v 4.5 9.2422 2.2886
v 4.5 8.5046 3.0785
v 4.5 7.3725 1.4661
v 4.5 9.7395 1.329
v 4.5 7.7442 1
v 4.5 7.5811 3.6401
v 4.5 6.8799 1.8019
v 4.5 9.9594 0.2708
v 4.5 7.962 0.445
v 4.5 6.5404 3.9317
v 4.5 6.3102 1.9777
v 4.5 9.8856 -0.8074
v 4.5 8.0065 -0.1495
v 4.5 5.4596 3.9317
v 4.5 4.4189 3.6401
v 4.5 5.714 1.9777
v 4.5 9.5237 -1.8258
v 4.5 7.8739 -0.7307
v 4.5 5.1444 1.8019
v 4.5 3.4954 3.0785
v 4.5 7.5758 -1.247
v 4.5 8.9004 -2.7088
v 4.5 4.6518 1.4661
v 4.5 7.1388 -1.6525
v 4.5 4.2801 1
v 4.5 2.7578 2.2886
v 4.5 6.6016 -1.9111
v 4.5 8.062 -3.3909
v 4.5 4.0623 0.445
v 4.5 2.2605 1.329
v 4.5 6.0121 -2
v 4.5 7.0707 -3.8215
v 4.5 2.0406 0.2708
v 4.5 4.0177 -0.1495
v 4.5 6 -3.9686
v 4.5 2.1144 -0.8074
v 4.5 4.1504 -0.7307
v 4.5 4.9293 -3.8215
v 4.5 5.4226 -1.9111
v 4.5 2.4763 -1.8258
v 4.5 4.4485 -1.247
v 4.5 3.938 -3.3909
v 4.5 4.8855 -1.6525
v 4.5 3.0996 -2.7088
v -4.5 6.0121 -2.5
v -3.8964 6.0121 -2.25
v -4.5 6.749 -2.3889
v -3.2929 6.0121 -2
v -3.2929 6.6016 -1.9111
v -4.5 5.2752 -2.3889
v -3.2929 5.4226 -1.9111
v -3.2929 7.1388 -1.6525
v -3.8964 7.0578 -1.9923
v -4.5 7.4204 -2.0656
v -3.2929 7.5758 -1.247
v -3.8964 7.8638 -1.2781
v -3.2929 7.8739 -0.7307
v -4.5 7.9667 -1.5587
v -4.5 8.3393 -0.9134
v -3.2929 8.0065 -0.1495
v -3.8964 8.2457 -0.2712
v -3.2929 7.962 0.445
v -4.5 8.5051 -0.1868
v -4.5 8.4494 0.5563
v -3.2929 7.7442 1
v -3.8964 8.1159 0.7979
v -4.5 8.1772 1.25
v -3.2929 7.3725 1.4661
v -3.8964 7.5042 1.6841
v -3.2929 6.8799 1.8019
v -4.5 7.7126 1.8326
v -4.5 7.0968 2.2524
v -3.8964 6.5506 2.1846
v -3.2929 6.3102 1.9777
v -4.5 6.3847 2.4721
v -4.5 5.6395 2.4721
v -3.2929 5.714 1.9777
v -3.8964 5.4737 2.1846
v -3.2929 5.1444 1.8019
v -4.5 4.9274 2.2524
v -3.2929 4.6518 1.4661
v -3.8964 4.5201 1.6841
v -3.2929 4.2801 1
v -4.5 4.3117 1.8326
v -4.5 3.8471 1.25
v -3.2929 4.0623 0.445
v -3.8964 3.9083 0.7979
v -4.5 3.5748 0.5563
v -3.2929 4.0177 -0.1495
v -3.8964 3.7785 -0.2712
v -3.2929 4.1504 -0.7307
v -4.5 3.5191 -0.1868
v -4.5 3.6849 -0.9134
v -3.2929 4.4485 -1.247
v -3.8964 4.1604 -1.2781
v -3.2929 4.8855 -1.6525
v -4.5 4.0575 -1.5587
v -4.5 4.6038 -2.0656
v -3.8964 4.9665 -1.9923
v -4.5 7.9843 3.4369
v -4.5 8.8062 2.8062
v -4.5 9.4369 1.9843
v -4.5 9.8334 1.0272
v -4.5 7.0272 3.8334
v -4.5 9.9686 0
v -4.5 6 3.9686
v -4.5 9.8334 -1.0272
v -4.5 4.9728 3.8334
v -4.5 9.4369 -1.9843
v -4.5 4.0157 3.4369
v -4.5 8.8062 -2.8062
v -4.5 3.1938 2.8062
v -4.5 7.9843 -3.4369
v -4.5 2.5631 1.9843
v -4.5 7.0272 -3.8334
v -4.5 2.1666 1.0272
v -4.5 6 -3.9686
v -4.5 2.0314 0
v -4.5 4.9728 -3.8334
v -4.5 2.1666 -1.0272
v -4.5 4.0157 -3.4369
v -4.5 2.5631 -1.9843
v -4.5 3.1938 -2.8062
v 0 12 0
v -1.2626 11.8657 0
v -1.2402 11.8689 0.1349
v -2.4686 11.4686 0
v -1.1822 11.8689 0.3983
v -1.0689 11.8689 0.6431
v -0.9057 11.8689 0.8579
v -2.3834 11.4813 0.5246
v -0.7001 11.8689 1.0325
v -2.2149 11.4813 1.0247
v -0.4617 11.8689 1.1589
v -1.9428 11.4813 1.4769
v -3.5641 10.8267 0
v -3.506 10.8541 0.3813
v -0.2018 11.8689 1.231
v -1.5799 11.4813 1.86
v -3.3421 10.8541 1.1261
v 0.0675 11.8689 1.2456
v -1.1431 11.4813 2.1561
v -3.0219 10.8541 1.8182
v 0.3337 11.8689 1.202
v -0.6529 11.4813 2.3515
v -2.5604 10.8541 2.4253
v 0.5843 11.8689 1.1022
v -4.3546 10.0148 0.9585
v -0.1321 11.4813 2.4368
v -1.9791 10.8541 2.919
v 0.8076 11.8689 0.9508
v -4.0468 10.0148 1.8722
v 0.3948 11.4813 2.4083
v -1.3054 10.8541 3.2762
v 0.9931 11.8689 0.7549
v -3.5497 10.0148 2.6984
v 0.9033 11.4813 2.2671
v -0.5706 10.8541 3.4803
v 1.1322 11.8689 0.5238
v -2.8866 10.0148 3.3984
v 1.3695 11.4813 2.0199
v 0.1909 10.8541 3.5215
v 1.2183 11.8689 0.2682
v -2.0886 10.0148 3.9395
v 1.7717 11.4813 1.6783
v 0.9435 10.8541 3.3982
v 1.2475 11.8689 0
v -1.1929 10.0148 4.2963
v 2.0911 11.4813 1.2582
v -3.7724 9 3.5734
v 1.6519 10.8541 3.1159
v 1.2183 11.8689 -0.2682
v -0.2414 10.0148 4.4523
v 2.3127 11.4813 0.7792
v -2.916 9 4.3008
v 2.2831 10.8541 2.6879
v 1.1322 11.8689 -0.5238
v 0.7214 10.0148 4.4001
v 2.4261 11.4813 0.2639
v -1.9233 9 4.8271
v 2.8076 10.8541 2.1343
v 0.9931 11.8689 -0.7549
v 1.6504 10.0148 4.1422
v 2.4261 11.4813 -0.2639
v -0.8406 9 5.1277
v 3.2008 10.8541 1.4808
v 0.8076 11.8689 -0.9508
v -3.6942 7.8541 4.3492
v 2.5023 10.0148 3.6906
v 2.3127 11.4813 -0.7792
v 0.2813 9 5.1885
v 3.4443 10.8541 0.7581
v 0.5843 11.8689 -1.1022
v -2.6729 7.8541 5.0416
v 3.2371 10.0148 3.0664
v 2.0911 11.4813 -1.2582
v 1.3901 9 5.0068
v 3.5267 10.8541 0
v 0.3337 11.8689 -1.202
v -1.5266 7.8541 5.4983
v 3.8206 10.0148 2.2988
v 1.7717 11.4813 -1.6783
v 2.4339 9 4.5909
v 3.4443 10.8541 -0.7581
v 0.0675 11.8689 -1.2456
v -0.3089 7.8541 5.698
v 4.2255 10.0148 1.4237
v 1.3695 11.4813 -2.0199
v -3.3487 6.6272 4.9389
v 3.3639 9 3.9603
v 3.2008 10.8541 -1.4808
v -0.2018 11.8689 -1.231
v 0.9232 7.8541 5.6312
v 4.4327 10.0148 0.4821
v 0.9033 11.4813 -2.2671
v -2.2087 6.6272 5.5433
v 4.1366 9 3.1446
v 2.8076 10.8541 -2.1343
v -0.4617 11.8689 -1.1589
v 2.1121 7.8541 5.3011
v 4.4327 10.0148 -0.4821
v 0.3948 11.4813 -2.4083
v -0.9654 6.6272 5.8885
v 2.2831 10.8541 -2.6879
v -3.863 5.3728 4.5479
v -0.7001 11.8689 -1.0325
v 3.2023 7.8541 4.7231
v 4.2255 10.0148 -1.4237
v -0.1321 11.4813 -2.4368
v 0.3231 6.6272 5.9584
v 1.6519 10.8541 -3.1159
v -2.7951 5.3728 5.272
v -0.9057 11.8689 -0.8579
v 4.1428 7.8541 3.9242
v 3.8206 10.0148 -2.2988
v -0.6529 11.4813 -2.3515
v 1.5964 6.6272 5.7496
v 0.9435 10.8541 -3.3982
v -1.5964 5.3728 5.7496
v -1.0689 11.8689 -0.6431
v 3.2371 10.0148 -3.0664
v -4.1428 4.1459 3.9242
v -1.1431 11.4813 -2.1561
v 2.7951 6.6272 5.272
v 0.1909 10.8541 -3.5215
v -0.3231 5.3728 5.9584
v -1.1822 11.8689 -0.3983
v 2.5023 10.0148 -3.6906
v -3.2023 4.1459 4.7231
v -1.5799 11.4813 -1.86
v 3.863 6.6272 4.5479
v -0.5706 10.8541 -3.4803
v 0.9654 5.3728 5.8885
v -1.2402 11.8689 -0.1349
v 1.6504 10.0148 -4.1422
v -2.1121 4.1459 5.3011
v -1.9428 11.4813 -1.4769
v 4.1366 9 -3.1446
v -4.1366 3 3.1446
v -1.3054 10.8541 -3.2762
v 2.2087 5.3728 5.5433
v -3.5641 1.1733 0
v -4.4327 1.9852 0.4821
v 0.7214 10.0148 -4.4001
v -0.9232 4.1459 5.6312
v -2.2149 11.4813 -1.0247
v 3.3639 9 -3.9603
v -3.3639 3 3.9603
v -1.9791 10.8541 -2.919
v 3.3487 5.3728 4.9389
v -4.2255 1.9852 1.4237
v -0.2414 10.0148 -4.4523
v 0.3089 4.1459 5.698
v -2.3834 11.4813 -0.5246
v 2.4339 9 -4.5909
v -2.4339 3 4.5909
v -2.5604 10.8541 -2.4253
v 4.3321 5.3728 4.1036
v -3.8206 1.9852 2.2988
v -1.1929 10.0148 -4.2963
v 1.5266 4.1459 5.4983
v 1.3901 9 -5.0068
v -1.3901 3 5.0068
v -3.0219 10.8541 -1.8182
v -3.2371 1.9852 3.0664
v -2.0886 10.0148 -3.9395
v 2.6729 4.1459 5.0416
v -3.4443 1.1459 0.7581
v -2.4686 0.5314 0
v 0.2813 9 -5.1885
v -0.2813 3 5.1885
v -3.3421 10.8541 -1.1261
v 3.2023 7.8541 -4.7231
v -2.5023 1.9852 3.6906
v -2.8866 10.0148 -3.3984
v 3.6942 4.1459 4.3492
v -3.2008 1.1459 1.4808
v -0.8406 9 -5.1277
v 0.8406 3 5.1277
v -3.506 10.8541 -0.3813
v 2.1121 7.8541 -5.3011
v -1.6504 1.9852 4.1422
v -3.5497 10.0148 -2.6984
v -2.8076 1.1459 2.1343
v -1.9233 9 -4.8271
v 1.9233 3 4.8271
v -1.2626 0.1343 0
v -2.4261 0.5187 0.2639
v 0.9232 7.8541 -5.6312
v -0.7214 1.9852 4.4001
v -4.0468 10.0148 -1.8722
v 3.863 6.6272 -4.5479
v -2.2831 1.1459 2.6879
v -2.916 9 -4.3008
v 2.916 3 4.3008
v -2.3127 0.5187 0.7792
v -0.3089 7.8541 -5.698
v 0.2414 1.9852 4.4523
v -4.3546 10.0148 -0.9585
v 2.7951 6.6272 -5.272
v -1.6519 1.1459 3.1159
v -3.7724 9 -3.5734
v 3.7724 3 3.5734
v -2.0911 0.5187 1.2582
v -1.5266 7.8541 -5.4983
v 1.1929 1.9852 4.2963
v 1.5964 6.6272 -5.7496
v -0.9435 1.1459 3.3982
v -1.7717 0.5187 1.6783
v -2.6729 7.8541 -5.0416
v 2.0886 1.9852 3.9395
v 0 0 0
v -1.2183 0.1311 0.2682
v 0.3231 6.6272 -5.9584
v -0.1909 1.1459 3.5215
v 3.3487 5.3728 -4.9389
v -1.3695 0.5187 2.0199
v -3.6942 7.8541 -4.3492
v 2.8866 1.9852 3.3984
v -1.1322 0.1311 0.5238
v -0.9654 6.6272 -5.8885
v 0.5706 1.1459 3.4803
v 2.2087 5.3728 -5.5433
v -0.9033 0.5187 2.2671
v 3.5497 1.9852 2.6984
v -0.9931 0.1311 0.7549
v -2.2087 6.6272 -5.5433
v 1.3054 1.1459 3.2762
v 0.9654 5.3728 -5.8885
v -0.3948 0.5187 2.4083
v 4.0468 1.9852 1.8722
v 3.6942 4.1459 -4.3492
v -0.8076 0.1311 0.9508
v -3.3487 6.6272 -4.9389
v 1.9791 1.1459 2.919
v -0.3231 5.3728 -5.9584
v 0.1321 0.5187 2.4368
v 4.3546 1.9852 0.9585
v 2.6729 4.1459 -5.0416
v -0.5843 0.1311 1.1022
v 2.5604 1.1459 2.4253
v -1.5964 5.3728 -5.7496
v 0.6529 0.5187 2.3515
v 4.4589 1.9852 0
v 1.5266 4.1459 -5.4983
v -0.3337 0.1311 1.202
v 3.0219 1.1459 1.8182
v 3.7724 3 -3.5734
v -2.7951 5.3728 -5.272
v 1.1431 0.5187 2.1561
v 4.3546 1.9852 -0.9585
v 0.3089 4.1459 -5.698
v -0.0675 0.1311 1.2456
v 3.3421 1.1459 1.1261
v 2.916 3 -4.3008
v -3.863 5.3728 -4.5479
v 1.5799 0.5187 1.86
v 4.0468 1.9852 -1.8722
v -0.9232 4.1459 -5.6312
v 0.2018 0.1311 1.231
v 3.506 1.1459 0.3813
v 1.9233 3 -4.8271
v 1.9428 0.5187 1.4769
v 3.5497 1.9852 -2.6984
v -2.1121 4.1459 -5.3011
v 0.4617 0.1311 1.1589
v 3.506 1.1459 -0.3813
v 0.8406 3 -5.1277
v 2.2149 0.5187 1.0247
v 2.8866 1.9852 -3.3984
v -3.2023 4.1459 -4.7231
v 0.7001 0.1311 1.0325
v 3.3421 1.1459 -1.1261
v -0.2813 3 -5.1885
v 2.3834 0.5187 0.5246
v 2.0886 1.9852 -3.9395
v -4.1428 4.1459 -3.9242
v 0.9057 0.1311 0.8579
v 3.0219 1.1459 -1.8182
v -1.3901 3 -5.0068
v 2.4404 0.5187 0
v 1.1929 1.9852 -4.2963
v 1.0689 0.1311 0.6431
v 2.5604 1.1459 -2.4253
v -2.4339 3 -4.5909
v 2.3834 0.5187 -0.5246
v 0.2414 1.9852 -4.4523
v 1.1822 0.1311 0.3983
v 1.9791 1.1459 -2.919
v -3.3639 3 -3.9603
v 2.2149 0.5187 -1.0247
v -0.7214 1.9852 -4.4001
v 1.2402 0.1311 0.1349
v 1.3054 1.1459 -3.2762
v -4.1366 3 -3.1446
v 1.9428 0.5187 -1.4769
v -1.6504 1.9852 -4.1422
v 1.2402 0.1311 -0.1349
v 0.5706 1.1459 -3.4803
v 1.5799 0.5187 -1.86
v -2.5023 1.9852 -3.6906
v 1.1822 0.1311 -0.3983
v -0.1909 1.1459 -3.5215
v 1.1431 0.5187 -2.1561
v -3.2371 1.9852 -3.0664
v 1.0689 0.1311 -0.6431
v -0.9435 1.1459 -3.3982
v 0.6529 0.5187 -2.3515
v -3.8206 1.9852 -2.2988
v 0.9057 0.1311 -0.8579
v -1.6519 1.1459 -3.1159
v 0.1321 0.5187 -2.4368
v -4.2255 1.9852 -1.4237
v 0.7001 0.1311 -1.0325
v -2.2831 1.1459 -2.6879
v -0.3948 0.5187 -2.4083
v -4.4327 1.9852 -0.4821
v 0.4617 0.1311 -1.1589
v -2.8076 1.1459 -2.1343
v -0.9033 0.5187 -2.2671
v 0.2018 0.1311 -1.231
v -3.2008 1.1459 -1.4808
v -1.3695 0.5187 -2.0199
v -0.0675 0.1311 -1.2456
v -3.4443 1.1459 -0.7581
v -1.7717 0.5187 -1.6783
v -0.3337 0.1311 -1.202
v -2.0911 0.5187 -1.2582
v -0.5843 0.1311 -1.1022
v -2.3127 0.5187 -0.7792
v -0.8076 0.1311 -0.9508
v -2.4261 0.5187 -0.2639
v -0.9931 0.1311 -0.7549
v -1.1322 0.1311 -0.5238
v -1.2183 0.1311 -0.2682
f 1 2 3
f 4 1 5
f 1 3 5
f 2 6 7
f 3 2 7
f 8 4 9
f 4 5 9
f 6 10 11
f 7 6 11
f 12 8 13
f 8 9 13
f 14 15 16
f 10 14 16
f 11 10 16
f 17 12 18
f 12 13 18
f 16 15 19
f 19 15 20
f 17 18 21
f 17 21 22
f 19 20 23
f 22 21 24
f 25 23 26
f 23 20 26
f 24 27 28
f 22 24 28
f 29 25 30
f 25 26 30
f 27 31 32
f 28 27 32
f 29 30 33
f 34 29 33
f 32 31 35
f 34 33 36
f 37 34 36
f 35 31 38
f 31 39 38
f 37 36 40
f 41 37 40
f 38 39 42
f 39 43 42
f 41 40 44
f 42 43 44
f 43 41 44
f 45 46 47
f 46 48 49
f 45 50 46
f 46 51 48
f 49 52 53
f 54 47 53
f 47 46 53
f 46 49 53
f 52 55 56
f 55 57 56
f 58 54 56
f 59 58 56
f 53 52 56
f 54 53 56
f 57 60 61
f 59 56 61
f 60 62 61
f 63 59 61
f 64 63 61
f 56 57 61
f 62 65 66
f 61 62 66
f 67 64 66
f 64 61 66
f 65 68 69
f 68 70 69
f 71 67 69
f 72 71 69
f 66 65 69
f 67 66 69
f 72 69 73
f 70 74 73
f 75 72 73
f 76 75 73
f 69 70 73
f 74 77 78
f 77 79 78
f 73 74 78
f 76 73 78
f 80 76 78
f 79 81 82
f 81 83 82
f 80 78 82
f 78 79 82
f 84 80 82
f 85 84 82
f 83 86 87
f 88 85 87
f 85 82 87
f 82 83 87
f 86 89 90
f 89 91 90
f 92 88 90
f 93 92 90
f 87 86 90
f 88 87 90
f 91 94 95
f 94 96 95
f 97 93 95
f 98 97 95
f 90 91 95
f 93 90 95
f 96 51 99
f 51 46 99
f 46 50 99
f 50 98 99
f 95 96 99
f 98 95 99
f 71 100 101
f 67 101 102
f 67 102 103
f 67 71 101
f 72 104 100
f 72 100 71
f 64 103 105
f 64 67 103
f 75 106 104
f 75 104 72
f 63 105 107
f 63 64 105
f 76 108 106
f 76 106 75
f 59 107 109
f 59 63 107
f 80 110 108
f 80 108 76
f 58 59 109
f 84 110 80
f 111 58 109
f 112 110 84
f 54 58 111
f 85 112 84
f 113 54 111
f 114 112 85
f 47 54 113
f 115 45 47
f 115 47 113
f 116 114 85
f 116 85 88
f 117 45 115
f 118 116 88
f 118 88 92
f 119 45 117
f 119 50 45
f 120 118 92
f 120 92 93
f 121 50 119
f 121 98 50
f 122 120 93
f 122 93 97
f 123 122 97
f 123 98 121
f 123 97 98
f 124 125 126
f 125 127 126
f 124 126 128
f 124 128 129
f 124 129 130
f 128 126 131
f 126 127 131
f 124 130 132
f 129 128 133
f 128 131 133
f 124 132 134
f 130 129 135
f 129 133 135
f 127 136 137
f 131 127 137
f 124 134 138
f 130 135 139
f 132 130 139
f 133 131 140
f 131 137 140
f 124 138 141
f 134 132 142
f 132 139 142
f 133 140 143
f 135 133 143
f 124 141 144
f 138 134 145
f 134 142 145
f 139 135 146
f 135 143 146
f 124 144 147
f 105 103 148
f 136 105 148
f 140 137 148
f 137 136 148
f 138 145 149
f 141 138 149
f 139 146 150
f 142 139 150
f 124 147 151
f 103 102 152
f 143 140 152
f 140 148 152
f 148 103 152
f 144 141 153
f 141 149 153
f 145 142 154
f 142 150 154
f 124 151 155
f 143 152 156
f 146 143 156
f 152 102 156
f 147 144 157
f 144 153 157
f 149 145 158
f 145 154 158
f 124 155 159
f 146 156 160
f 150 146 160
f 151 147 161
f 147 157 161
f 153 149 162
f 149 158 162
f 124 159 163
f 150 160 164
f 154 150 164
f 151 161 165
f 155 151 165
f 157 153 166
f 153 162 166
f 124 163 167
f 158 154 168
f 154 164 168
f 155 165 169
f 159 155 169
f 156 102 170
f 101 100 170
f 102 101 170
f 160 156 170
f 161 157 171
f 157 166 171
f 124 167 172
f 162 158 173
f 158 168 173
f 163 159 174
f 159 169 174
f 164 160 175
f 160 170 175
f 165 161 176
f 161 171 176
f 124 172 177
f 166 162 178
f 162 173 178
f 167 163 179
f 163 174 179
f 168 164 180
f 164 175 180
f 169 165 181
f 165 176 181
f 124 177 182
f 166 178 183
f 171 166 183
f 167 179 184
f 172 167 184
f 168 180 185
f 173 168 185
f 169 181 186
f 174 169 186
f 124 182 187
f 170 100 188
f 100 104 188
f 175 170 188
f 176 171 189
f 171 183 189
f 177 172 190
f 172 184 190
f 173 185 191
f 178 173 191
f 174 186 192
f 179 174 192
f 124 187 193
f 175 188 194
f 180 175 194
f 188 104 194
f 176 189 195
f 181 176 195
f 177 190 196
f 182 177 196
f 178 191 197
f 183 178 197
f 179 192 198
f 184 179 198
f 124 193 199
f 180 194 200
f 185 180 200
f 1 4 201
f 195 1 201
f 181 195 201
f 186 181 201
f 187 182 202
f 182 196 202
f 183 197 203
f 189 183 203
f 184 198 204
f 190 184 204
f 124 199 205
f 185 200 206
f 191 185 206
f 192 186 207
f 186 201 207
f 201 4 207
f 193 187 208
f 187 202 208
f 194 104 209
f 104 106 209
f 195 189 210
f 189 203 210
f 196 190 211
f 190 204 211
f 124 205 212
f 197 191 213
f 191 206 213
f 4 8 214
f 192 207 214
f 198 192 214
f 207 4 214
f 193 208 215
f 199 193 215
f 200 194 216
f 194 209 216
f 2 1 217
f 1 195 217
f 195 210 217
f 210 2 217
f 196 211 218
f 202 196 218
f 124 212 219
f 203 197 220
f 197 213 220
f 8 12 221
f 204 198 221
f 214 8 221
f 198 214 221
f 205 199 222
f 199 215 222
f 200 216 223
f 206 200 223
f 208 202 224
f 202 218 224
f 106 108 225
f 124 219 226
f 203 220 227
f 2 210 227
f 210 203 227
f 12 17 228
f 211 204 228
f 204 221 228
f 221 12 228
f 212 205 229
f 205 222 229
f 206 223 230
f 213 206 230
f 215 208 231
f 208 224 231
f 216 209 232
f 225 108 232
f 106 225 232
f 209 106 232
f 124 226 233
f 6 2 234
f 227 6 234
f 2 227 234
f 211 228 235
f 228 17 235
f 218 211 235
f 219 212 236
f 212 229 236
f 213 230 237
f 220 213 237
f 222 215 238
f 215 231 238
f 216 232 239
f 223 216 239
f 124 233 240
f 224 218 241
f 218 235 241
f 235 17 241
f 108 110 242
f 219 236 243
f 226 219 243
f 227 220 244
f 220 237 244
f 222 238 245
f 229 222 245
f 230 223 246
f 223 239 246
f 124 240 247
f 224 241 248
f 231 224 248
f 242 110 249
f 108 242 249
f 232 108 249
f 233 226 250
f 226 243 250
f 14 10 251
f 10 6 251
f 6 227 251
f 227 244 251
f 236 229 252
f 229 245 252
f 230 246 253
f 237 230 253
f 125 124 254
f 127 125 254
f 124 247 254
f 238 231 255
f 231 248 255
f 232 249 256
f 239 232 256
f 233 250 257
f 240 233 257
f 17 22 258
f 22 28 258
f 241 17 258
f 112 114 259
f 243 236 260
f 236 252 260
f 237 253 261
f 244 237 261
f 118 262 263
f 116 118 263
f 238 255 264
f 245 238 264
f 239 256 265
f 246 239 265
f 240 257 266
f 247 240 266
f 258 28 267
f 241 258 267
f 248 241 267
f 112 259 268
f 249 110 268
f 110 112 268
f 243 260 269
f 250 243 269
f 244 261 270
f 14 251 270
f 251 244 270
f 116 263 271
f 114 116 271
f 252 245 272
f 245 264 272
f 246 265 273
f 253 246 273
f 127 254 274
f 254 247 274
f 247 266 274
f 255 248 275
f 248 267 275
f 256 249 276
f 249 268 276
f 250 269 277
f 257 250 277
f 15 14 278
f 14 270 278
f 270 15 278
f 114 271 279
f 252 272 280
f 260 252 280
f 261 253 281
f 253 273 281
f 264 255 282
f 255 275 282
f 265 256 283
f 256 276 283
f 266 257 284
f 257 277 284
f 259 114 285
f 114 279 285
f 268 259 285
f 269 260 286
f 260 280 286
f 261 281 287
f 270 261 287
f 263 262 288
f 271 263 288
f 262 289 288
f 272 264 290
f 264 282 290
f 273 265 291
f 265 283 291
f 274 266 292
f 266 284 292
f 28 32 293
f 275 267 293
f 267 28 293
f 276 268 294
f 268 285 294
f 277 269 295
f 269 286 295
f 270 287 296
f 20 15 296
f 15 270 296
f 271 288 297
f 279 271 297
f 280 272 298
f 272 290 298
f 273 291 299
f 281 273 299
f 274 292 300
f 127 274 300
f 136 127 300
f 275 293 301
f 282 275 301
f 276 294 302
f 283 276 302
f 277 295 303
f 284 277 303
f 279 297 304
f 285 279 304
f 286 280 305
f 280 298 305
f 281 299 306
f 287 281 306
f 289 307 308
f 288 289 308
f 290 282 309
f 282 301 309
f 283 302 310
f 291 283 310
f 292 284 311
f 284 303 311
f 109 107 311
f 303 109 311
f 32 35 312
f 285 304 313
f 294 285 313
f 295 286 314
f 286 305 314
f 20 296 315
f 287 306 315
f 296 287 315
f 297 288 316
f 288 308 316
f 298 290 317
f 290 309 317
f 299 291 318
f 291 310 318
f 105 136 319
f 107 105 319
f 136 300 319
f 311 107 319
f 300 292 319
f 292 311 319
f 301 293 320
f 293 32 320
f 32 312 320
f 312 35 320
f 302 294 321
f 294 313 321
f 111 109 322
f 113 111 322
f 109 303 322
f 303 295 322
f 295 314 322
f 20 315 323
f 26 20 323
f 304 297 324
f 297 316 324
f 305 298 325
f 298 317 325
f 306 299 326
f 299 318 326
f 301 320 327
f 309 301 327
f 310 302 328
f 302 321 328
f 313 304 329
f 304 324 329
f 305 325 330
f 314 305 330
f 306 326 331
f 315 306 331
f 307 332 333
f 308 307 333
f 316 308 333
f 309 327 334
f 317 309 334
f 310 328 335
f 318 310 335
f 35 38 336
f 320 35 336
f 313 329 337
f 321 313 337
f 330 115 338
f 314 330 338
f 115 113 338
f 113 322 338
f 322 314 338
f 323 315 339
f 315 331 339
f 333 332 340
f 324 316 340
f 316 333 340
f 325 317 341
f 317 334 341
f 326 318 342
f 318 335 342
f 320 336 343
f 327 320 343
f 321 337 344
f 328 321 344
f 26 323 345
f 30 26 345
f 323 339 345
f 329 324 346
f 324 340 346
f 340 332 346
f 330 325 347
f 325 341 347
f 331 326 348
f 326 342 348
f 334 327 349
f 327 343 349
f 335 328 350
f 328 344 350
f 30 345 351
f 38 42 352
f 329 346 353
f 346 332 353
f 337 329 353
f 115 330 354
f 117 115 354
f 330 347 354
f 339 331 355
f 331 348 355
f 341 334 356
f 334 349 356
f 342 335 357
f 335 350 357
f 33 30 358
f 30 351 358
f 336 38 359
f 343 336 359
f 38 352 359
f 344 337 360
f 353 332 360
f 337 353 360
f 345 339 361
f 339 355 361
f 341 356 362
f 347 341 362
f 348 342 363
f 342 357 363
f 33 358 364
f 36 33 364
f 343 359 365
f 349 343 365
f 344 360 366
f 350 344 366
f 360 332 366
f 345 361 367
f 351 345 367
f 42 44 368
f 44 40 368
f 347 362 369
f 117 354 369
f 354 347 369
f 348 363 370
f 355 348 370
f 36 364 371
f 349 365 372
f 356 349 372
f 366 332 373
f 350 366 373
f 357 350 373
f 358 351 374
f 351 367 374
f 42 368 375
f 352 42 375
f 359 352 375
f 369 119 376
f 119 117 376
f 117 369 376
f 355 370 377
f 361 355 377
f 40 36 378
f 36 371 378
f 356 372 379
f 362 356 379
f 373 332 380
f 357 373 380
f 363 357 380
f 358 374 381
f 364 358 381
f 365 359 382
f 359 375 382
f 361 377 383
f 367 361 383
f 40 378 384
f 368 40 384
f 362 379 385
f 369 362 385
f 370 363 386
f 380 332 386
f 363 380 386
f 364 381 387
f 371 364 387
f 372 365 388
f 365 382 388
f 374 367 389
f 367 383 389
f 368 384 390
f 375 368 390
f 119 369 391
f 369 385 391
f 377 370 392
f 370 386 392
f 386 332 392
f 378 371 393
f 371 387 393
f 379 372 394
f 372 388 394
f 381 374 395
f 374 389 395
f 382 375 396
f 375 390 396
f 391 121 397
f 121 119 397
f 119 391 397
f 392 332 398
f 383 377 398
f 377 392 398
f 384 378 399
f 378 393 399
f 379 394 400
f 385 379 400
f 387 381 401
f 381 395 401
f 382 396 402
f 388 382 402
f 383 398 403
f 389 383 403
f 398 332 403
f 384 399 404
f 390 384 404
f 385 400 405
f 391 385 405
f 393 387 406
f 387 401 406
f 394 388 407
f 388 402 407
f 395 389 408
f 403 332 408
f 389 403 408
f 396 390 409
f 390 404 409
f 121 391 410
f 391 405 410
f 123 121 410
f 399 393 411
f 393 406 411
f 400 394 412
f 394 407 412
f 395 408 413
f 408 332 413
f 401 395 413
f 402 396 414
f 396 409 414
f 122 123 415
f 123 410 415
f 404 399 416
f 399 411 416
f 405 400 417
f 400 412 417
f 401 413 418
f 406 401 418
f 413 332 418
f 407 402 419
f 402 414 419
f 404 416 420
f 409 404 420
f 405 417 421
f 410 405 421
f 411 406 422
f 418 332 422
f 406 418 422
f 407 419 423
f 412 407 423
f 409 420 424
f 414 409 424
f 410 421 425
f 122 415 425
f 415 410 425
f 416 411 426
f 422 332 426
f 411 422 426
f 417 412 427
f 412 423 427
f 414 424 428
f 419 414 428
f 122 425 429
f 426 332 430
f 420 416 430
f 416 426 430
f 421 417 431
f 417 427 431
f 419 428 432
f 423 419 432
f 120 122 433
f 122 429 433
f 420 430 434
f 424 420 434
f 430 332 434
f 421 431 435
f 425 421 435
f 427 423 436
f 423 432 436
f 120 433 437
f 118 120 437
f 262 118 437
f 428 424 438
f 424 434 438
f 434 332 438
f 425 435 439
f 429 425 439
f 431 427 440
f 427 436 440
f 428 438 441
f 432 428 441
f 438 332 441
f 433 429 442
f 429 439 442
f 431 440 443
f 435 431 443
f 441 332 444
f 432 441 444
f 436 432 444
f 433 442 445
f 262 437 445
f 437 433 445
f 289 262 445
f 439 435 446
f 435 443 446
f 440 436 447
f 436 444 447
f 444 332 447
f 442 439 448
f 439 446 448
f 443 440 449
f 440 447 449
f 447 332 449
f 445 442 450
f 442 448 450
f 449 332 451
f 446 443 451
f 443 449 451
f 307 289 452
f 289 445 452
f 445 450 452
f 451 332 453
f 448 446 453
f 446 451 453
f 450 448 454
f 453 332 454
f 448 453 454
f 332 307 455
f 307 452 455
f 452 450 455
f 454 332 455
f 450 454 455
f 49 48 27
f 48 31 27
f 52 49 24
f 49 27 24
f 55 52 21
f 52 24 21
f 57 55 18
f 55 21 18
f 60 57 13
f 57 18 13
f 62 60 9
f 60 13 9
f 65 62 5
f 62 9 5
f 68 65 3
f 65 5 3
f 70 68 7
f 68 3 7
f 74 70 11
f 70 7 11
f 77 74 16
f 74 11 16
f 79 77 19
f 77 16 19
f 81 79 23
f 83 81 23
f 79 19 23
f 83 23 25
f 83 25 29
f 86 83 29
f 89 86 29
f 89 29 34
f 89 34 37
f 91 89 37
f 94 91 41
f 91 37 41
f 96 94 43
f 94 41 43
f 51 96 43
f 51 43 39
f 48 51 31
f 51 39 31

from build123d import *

# Parameters (mm, degrees)
CUT_EXTRUDE2_OUTLINE_W = 3
CUT_EXTRUDE2_OUTLINE_H = 14.95468232
CUT_EXTRUDE2_DEPTH     = 12
HOLE1_D                = 4
HOLE1_DEPTH            = 12
HOLE1_CSINK_D          = 5
HOLE1_CSINK_ANGLE      = 45


with BuildPart() as part:
    # Sketch1 → Revolve1 (revolve)
    with BuildSketch(Plane.XY):
        with BuildLine():
            Line((0, 0), (0, 12))
            ThreePointArc((0, 12), (-6, 6), (0, 0))
        make_face()
    revolve(axis=Axis((0, 0, 0), (0, 1, 0)))

    # Cut-Extrude2: read off the stored shape, not the designer's step
    # Cut-Extrude2 outline → Cut-Extrude2 (cut)
    with BuildSketch(Plane(origin=(0, 0, 0), x_dir=(1, 0, 0), z_dir=(0, 1, 0))):
        with Locations((-6, 0)):
            Rectangle(CUT_EXTRUDE2_OUTLINE_W, CUT_EXTRUDE2_OUTLINE_H)
    cut_extrude2 = extrude(amount=CUT_EXTRUDE2_DEPTH, mode=Mode.SUBTRACT)

    # Mirror2: Cut-Extrude2 across plane
    add(cut_extrude2.mirror(Plane(origin=(0, 0, 0), x_dir=(0, 0, 1), z_dir=(1, 0, 0))), mode=Mode.SUBTRACT)

    # Hole1
    with Locations(Plane.ZY.offset(4.5)):
        with Locations((0, 6.01212861)):
            CounterSinkHole(HOLE1_D / 2, HOLE1_CSINK_D / 2, depth=HOLE1_DEPTH, counter_sink_angle=HOLE1_CSINK_ANGLE)


solid = part.part
